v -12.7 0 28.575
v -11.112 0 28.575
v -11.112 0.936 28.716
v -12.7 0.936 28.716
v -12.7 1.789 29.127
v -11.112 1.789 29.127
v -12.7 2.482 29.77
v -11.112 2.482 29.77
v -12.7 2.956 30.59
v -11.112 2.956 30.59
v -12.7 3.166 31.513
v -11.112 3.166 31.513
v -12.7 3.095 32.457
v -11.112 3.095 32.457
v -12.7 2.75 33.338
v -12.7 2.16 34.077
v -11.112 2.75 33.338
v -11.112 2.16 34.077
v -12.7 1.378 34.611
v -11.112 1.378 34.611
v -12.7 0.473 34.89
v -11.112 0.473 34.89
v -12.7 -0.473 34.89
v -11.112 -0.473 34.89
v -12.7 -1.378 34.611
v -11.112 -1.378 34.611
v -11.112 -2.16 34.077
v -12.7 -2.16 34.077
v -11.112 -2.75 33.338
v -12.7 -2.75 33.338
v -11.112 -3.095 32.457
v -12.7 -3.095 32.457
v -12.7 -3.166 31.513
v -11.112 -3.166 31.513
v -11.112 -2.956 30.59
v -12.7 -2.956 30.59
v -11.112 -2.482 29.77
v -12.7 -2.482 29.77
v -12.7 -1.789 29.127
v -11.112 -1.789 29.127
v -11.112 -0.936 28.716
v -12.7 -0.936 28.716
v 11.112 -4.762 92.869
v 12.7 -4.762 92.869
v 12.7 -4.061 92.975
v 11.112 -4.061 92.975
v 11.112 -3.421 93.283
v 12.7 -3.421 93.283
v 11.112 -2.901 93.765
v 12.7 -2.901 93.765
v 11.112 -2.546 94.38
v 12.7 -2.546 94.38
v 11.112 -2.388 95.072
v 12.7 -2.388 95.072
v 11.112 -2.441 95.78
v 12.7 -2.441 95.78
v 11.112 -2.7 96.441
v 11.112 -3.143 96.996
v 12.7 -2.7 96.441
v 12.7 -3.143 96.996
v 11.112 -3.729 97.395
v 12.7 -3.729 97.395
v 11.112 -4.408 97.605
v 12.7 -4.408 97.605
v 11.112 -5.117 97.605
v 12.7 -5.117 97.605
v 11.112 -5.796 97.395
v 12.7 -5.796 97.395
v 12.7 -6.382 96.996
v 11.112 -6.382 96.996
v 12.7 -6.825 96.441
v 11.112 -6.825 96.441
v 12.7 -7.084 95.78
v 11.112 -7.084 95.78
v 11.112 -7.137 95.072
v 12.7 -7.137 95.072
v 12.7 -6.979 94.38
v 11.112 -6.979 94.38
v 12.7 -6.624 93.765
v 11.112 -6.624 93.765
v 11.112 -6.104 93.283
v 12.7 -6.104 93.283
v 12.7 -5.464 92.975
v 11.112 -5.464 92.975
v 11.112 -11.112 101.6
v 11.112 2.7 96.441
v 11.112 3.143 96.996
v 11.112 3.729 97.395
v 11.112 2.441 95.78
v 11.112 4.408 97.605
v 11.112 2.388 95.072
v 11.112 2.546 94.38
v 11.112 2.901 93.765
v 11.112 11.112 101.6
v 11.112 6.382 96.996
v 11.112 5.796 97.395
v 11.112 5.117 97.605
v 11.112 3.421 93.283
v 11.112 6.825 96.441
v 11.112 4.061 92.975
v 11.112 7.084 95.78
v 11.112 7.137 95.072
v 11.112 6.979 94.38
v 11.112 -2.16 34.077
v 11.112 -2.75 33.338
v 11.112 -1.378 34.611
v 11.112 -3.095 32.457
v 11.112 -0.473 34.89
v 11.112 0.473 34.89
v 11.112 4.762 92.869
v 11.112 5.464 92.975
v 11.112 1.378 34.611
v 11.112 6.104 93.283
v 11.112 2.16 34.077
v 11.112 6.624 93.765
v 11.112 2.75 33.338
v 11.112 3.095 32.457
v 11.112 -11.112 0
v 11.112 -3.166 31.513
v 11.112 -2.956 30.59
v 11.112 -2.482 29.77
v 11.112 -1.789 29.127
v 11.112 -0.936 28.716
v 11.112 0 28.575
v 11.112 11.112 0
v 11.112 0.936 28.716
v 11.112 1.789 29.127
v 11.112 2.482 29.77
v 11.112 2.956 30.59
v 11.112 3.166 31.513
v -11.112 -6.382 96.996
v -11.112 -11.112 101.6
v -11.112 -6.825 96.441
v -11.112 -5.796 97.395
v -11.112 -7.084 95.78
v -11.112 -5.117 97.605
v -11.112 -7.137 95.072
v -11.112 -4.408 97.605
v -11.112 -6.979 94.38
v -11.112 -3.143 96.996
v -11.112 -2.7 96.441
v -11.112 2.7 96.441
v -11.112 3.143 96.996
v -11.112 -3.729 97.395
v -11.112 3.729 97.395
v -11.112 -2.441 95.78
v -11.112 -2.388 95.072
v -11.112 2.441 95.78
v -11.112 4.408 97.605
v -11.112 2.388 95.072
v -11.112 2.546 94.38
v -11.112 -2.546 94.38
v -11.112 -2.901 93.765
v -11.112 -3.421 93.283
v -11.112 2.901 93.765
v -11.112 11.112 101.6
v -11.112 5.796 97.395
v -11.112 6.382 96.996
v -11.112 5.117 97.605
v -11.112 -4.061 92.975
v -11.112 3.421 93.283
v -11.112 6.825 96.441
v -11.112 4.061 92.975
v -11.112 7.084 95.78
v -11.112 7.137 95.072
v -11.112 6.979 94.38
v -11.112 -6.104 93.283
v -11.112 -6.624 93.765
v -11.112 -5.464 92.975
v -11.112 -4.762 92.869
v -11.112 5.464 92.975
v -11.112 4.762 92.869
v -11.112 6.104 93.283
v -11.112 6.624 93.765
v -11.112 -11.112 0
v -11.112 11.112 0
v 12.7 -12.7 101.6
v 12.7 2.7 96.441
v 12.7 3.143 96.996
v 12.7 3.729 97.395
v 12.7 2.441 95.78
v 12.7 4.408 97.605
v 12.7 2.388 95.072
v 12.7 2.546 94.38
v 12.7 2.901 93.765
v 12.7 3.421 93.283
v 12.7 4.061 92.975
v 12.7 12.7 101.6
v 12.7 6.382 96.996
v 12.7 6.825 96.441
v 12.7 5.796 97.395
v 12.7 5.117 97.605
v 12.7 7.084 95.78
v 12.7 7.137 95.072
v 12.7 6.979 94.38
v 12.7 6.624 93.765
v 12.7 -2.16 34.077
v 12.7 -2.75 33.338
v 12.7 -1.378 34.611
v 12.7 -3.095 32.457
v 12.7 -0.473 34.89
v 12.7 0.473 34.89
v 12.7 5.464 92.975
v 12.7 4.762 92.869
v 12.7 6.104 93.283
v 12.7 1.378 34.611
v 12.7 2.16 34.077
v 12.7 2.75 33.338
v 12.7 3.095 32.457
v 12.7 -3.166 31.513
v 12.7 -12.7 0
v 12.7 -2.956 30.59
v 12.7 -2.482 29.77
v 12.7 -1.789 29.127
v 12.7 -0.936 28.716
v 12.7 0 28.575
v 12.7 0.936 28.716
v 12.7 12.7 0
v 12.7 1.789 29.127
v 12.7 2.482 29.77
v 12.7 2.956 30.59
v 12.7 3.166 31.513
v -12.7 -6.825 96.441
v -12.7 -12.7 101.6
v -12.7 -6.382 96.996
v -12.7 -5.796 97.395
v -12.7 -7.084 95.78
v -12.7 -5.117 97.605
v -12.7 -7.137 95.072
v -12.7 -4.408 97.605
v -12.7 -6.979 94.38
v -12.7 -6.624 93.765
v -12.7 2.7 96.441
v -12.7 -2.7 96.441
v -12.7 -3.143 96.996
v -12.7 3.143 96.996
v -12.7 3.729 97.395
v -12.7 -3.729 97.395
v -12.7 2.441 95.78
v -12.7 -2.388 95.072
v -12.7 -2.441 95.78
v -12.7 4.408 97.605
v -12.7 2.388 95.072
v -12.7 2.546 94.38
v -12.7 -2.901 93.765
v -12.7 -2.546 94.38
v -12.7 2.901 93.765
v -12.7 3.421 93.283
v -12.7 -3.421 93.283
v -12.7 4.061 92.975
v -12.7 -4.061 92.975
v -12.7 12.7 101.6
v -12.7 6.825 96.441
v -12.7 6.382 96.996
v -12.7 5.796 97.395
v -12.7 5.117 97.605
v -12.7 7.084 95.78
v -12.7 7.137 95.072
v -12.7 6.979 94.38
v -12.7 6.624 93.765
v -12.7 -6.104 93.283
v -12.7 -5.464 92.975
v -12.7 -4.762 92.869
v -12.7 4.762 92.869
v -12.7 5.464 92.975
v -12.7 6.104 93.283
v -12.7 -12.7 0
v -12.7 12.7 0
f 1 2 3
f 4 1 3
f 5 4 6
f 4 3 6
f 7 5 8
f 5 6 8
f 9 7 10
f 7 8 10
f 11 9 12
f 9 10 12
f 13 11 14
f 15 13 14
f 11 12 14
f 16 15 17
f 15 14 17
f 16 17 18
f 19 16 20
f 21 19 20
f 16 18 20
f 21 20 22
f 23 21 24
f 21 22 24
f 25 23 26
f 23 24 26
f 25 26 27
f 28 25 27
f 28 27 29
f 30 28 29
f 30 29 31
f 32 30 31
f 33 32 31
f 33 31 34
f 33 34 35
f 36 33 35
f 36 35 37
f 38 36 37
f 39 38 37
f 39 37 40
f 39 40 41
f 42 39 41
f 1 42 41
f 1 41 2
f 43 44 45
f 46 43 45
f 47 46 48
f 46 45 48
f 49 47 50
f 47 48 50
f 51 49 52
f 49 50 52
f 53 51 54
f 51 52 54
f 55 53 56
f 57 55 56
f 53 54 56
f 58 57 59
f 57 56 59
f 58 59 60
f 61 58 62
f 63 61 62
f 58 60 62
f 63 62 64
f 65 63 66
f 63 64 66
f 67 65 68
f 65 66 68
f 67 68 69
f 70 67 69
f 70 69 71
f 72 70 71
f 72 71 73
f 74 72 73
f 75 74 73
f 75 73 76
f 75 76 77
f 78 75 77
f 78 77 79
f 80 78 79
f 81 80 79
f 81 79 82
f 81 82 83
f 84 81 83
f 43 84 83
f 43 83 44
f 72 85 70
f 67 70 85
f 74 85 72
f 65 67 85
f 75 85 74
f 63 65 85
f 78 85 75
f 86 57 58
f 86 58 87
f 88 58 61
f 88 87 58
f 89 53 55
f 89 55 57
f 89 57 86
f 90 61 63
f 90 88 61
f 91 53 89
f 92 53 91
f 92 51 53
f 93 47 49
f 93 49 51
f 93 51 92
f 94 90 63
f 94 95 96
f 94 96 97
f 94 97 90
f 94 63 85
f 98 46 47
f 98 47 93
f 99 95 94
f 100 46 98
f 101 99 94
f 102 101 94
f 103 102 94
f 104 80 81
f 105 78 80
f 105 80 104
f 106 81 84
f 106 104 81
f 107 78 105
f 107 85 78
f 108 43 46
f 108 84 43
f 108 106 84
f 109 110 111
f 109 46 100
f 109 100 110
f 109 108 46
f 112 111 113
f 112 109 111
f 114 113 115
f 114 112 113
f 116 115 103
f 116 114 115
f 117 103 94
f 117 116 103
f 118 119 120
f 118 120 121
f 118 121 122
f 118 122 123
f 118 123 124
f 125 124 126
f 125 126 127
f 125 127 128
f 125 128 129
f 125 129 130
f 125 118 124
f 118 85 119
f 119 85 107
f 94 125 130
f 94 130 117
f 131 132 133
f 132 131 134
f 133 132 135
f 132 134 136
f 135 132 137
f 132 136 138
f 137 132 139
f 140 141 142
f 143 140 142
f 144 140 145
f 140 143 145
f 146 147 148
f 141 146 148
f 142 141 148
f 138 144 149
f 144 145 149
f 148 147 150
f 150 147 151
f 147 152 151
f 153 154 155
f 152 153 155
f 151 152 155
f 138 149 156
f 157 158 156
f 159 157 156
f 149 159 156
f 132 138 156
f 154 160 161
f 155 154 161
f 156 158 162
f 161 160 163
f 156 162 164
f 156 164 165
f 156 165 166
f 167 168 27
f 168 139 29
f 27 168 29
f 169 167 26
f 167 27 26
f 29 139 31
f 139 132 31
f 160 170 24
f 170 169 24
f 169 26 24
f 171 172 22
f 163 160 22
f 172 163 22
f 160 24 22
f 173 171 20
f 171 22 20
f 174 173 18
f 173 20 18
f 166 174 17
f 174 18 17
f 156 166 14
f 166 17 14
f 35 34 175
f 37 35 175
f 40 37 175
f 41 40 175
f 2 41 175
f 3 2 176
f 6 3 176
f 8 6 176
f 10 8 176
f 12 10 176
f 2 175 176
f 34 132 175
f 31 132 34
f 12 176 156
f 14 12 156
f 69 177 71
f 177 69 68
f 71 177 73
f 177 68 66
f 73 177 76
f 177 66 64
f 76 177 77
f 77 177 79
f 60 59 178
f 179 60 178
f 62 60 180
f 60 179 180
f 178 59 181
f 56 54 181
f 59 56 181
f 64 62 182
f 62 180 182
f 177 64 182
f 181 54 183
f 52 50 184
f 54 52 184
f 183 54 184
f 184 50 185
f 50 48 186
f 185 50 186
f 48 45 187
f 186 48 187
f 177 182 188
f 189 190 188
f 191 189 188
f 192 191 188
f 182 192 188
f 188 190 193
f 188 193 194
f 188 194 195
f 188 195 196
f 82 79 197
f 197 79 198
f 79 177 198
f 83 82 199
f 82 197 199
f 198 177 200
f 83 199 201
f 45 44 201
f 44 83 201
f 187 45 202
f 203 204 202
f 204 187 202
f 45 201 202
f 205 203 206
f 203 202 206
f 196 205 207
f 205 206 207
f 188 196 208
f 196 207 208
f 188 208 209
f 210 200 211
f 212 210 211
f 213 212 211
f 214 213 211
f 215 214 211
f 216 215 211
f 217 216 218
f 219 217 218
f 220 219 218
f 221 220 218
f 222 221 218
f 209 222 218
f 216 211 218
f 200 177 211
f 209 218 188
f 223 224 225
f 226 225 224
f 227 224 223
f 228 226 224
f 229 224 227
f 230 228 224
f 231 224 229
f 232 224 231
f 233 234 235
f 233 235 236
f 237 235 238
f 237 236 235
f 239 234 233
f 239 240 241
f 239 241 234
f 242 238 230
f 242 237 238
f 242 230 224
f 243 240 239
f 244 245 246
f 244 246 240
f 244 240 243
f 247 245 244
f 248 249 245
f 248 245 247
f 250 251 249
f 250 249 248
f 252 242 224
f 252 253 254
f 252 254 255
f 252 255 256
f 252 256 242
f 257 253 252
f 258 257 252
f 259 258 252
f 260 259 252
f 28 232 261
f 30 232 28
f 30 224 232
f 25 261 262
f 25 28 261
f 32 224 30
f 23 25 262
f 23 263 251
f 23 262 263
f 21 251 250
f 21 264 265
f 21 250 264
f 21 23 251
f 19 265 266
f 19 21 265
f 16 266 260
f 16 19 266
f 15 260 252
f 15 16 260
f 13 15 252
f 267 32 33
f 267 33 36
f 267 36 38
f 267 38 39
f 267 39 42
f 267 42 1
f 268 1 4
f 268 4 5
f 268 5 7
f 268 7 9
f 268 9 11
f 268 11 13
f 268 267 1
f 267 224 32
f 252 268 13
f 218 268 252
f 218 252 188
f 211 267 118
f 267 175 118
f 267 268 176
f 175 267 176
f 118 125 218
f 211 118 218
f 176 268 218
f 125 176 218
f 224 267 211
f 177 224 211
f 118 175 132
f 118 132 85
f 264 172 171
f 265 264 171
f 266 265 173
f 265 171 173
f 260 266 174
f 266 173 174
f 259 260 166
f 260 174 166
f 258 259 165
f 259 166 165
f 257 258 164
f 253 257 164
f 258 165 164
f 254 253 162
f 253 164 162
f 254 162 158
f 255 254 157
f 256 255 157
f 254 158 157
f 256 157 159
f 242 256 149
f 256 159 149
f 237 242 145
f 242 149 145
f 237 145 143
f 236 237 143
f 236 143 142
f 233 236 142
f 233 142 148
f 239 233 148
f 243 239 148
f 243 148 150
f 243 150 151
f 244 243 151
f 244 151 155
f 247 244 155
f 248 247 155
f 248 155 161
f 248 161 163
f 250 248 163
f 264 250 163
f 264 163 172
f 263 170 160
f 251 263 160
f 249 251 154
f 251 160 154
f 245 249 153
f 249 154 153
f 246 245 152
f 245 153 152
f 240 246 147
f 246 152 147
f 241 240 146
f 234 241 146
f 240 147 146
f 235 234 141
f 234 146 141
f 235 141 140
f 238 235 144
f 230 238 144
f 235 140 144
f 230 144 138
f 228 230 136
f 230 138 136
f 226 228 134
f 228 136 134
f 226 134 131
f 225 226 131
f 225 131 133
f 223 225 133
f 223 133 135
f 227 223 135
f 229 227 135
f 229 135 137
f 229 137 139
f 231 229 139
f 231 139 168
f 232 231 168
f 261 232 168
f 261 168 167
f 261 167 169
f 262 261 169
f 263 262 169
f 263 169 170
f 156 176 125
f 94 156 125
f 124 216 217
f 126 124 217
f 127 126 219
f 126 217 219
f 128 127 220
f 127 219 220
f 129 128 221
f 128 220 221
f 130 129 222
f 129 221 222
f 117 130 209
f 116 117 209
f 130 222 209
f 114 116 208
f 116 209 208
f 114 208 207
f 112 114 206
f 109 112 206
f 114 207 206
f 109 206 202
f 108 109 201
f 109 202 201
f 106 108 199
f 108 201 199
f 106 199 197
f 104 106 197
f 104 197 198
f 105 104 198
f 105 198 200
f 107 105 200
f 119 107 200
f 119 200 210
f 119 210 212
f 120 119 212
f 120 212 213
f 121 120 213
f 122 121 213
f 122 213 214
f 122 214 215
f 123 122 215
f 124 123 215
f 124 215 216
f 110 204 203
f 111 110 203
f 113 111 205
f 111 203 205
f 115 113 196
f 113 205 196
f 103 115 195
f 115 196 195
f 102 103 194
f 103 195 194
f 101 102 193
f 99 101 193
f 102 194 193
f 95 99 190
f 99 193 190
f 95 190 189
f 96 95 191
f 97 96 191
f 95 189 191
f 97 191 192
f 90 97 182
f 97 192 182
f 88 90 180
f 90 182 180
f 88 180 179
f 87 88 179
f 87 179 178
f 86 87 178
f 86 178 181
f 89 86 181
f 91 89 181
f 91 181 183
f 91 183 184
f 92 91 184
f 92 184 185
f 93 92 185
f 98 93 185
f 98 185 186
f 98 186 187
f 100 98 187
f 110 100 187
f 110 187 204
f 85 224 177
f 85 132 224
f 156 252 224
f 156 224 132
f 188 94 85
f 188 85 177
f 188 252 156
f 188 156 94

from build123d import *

# Parameters (mm, degrees)
SKETCH1_W           = 25.4
SKETCH1_H           = 25.4
SKETCH1_W_2         = 22.225
SKETCH1_H_2         = 22.225
BOSS_EXTRUDE1_DEPTH = 101.6
SKETCH2_R           = 2.38125
SKETCH2_R_2         = 3.175
CUT_EXTRUDE1_DEPTH  = 25.4


with BuildPart() as part:
    # Sketch1 → Boss-Extrude1 (new body)
    with BuildSketch(Plane.XY):
        Rectangle(SKETCH1_W, SKETCH1_H)
        Rectangle(SKETCH1_W_2, SKETCH1_H_2, mode=Mode.SUBTRACT)
    extrude(amount=BOSS_EXTRUDE1_DEPTH)

    # Sketch2 → Cut-Extrude1 (cut)
    with BuildSketch(Plane(origin=(12.7, 0, 0), x_dir=(0, 0, -1), z_dir=(1, 0, 0))):
        with Locations((-95.25, 4.7625)):
            Circle(SKETCH2_R)
        with Locations((-95.25, -4.7625)):
            Circle(SKETCH2_R)
        with Locations((-31.75, 0)):
            Circle(SKETCH2_R_2)
    extrude(amount=-CUT_EXTRUDE1_DEPTH, mode=Mode.SUBTRACT)


solid = part.part
